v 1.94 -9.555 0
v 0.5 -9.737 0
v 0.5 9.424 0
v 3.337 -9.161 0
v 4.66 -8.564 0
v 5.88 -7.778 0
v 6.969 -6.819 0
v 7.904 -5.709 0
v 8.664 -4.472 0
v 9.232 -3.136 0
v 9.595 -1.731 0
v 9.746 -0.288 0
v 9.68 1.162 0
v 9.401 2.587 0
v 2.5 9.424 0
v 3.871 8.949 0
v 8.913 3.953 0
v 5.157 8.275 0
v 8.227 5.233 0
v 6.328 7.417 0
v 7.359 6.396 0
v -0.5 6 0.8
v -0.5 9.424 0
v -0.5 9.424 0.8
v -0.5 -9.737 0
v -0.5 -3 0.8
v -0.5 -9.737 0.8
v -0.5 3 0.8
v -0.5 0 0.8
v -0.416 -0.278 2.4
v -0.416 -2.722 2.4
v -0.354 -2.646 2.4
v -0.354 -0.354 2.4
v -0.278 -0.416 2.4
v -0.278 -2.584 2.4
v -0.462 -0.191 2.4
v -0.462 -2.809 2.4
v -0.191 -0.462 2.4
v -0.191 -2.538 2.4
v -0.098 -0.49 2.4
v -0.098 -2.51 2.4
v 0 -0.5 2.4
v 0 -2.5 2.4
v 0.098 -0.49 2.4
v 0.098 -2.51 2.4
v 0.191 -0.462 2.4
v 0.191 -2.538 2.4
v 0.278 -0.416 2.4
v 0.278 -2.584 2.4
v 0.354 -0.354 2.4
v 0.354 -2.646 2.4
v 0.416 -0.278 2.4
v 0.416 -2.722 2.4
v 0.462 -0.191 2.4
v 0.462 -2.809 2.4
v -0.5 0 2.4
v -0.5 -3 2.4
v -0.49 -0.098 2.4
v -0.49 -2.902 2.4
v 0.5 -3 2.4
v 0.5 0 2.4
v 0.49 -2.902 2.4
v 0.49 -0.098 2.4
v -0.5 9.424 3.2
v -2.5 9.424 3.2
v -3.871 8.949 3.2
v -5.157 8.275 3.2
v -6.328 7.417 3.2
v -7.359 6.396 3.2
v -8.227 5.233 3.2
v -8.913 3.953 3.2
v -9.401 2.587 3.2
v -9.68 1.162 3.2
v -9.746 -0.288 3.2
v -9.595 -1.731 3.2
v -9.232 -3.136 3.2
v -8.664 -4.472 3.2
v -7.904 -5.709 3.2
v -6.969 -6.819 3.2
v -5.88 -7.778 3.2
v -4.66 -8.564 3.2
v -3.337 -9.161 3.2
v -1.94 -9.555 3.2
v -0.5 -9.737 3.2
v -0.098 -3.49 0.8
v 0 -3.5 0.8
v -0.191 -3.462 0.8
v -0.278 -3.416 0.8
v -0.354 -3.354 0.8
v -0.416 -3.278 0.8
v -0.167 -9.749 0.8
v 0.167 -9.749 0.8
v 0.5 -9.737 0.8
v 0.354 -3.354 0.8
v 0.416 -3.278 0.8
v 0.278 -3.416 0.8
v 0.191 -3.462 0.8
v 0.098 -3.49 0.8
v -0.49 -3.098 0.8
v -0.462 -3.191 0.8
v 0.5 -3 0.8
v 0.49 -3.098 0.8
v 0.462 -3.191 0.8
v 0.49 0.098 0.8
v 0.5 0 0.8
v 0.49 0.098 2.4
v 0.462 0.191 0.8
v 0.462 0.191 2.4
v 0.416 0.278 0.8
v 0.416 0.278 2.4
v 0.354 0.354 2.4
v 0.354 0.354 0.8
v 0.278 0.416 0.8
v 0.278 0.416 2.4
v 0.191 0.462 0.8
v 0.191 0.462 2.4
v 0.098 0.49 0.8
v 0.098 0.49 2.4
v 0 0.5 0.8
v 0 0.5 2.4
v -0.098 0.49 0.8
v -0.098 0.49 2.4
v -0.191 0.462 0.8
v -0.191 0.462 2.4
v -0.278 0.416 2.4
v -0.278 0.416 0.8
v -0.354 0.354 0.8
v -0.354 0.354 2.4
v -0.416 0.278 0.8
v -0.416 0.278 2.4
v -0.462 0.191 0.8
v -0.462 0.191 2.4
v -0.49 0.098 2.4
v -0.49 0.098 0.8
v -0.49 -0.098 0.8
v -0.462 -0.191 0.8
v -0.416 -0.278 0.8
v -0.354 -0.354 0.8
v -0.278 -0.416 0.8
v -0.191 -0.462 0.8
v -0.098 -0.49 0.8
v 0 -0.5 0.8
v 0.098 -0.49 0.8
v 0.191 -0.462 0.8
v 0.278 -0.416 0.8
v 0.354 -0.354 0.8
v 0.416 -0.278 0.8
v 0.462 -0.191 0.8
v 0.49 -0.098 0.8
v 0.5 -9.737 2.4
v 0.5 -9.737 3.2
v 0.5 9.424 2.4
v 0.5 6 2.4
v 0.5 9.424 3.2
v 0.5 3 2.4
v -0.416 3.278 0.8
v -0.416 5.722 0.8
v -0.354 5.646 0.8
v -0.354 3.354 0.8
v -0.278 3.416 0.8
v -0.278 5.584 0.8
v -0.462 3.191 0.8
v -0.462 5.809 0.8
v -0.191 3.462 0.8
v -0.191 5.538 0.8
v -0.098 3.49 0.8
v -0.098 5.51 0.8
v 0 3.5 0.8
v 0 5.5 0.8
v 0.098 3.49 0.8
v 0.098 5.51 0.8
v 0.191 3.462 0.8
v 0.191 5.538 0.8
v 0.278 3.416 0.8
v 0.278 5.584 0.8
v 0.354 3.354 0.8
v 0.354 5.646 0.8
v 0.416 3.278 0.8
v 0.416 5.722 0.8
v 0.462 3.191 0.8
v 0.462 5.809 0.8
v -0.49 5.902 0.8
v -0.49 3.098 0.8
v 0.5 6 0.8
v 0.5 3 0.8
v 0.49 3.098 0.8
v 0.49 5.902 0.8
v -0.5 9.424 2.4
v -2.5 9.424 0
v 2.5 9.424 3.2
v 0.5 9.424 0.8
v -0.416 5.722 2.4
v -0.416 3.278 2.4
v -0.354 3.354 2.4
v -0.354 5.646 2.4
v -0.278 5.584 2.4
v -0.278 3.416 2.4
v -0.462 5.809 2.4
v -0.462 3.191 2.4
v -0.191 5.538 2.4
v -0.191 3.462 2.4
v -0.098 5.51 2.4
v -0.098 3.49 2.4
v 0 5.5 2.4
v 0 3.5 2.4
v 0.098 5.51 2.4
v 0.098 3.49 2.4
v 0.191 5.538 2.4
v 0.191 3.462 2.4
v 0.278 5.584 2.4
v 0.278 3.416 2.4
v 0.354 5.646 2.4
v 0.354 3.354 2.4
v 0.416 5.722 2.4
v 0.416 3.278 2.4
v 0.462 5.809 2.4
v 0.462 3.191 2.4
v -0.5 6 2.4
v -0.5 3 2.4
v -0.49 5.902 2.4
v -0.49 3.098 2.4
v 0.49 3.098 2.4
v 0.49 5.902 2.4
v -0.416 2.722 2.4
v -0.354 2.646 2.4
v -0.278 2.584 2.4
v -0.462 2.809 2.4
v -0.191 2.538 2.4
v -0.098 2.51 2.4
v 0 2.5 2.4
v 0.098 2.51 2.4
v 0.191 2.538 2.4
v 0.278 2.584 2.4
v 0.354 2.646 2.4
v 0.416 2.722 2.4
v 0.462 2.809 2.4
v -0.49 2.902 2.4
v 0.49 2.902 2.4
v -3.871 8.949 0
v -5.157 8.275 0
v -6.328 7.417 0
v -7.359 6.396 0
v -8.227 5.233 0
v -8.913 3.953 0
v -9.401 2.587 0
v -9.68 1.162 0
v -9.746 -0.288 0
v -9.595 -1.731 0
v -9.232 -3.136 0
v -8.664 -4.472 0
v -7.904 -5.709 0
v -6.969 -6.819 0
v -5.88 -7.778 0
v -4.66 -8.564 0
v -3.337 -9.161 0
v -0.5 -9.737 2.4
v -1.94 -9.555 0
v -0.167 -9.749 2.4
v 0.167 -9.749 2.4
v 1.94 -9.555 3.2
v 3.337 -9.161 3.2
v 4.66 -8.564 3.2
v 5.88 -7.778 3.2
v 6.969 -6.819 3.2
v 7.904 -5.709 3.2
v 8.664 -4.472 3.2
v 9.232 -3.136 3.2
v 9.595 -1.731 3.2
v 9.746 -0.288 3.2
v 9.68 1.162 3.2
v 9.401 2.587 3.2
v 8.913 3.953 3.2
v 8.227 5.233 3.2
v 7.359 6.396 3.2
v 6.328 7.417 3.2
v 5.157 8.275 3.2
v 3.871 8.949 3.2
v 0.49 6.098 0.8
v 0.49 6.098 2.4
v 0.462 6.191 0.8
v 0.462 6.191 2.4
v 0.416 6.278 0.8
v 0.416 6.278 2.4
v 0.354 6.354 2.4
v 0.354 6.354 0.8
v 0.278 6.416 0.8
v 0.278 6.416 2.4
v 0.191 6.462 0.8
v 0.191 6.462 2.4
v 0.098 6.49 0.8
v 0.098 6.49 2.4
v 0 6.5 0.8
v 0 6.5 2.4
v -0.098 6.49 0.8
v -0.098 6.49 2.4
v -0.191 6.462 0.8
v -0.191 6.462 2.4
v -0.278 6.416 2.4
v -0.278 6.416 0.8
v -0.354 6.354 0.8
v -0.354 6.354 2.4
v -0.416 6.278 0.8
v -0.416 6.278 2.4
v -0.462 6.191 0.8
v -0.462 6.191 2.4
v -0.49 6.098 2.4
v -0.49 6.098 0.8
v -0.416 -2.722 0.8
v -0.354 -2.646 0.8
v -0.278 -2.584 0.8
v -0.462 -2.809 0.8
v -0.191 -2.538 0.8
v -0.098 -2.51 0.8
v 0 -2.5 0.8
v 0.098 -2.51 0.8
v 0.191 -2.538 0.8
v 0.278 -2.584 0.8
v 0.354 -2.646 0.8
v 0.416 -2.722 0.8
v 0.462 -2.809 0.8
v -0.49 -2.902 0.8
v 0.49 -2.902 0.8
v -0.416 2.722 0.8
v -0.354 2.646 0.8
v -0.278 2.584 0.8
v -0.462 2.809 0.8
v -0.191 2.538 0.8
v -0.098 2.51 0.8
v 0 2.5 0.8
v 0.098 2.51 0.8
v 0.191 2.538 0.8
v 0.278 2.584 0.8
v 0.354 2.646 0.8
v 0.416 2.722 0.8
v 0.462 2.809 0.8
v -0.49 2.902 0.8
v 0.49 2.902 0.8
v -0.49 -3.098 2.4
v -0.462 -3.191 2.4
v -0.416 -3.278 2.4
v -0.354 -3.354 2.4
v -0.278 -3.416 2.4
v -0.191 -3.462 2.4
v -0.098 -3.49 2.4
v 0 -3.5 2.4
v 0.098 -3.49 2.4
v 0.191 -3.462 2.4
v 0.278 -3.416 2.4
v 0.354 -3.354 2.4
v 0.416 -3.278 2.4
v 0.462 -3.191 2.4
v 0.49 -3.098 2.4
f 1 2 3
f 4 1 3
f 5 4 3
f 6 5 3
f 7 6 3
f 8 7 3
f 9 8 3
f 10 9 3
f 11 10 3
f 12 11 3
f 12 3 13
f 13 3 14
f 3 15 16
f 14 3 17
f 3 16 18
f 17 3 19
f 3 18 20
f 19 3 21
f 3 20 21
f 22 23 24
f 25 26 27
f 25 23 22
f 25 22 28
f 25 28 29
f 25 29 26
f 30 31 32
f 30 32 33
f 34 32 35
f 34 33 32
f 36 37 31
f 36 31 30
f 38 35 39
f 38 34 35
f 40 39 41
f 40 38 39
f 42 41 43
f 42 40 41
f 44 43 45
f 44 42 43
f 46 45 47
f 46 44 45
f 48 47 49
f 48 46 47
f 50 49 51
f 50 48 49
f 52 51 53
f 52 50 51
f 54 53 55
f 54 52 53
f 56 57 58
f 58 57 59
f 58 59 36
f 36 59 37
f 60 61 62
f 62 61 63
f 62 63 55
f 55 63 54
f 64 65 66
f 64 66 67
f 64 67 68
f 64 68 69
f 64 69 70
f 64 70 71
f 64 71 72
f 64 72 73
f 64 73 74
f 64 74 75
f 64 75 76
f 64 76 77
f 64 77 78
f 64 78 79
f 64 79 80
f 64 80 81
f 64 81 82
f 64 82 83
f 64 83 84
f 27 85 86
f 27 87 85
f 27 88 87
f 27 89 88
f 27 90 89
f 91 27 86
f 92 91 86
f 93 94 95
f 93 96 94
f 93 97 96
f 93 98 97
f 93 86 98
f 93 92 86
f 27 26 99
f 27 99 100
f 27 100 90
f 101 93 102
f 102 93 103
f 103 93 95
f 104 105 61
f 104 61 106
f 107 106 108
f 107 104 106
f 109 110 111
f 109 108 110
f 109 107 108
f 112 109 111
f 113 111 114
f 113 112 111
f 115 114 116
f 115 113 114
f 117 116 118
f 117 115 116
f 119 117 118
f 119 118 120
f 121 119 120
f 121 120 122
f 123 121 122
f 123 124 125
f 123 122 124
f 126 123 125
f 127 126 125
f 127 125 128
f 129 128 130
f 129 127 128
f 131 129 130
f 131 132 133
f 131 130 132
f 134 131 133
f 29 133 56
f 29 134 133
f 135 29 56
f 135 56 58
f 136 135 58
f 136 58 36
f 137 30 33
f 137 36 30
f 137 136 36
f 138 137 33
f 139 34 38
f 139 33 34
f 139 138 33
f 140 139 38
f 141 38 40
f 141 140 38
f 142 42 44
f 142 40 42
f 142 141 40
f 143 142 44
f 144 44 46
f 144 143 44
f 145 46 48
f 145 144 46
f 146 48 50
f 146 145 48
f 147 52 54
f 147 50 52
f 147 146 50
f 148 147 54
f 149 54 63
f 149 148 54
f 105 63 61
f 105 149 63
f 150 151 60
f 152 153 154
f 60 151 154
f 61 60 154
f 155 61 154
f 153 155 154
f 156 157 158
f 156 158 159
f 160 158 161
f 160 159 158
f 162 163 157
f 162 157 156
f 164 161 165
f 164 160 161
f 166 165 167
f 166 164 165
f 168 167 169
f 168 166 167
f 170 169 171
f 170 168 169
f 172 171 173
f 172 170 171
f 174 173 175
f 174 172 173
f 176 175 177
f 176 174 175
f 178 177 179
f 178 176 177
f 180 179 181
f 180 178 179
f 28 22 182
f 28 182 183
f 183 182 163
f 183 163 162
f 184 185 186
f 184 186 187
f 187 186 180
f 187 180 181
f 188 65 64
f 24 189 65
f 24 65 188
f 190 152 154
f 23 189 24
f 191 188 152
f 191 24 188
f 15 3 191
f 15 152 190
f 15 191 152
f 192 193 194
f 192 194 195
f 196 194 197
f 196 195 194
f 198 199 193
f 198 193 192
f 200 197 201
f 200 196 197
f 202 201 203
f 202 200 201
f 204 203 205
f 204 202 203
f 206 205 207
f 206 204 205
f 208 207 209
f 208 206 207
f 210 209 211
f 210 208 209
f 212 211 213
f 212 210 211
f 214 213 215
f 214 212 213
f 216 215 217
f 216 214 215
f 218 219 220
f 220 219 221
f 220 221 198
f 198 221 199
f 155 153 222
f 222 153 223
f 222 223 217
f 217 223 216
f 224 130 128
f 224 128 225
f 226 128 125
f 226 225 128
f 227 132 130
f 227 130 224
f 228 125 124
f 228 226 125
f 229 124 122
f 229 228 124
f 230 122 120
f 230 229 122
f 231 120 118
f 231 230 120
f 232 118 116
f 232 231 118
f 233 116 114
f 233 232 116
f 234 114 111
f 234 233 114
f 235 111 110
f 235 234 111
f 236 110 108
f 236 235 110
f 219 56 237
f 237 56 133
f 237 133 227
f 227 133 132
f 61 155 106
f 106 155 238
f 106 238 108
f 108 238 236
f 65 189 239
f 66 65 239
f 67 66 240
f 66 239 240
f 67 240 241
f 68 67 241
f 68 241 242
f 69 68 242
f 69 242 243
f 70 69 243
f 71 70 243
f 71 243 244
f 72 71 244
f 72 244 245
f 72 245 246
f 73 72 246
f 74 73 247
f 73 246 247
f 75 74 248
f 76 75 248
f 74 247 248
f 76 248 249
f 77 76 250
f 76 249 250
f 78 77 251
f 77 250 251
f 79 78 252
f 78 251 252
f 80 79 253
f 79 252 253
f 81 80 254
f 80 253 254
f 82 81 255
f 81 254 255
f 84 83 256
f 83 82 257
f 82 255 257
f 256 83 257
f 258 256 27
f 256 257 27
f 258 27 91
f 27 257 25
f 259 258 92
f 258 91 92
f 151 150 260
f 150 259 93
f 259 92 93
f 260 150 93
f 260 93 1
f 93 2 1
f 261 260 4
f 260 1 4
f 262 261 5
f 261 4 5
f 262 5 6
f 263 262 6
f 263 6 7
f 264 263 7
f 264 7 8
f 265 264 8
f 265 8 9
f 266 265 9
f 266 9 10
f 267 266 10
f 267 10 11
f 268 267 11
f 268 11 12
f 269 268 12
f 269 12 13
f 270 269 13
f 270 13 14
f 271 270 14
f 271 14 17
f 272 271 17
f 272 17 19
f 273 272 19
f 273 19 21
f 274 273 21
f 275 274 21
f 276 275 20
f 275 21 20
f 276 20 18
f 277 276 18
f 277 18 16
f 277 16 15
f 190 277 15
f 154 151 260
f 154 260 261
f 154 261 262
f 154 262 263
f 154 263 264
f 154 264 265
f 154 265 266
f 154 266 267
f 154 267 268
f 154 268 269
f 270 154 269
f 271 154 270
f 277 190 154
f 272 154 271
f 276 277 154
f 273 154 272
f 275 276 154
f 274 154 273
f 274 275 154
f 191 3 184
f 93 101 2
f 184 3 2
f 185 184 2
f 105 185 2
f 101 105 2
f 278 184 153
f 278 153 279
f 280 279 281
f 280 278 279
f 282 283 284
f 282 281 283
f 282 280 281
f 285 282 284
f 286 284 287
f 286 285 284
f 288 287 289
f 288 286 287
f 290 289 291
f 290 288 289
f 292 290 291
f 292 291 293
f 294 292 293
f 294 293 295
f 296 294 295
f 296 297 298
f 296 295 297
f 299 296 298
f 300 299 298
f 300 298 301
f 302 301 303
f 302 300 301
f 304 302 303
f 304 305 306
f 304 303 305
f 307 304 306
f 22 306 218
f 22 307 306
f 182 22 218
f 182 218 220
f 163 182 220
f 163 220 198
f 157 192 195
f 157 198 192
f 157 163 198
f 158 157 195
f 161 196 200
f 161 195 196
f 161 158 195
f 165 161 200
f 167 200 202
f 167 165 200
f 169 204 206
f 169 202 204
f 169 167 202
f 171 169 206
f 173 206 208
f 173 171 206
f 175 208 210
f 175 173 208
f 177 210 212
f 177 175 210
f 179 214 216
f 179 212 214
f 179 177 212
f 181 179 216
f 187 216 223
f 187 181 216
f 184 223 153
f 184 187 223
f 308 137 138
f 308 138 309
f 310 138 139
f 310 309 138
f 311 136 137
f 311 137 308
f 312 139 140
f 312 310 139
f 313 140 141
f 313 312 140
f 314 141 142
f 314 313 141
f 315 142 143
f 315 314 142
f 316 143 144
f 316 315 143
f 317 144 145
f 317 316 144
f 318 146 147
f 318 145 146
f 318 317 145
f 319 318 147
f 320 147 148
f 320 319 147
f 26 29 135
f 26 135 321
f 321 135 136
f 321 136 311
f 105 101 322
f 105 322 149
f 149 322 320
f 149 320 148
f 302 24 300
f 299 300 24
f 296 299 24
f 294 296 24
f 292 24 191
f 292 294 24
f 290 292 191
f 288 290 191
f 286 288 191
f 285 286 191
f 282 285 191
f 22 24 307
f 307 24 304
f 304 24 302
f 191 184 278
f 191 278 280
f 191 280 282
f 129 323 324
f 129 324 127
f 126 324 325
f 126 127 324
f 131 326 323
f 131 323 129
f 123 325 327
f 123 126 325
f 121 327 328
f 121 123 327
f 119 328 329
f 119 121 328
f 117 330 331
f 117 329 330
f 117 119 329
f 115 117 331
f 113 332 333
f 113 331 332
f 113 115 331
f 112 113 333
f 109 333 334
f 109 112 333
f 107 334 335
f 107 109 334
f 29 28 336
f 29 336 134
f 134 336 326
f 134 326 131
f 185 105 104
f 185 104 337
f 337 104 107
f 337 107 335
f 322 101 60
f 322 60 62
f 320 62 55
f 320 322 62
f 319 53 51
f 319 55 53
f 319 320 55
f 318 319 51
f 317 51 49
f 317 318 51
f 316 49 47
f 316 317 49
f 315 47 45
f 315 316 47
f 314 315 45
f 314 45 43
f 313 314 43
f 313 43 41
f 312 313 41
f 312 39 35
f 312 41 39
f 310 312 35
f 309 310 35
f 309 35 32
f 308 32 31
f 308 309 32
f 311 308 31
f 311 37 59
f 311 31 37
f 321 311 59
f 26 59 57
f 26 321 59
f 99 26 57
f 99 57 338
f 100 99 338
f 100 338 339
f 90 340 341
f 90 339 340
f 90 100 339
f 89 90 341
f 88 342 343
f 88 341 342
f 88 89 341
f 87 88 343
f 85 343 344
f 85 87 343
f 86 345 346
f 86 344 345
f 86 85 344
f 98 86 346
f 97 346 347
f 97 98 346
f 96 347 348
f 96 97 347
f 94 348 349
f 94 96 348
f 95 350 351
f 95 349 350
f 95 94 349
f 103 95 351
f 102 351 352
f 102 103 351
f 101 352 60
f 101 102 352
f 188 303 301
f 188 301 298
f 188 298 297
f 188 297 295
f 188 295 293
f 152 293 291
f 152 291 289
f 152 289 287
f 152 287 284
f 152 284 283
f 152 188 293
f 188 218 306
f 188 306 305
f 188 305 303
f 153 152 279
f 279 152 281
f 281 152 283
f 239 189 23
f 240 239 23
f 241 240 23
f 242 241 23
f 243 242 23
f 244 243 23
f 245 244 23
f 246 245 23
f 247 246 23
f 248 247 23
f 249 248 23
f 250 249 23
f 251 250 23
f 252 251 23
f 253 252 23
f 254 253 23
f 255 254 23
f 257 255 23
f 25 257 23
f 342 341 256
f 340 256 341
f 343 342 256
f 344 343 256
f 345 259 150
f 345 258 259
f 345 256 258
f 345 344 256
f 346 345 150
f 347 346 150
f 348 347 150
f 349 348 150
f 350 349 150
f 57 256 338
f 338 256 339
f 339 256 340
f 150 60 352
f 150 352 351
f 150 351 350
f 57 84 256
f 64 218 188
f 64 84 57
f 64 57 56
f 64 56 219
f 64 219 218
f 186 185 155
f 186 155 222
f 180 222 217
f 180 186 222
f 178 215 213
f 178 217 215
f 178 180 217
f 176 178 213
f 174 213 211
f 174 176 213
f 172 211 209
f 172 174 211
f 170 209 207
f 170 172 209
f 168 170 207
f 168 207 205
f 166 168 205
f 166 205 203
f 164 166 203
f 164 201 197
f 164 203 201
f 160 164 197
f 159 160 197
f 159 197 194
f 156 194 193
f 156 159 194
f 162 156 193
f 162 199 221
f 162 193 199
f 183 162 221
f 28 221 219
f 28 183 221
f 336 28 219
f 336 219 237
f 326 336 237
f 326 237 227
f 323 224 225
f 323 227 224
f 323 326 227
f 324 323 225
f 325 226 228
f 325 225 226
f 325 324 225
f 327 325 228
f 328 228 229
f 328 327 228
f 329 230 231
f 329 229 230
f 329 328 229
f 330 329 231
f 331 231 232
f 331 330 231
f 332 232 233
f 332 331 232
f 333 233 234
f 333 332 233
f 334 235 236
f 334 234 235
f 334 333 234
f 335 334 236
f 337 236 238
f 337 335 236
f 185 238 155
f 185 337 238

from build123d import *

# Parameters (mm, degrees)
PAD_DEPTH       = 3.2
SKETCH001_W     = 1
SKETCH001_H     = 22
POCKET_DEPTH    = 0.8
SKETCH002_R     = 0.5
POCKET001_DEPTH = 3.201
SKETCH003_W     = 1
SKETCH003_H     = 22
POCKET002_DEPTH = 0.8


with BuildPart() as part:
    # Sketch → Pad (new body)
    with BuildSketch(Plane.XY):
        with BuildLine():
            ThreePointArc((-2.5, 9.424038), (0, -9.75), (2.5, 9.424038))
            Line((-2.5, 9.424038), (2.5, 9.424038))
        make_face()
    extrude(amount=PAD_DEPTH)

    # Sketch001 (on Face4 of Pad) → Pocket (cut)
    with BuildSketch(Plane.XY.offset(3.2)):
        Rectangle(SKETCH001_W, SKETCH001_H)
    extrude(amount=-POCKET_DEPTH, mode=Mode.SUBTRACT)

    # Sketch002 → Pocket001 (cut, through all)
    with BuildSketch(Plane.XY):
        with Locations((0, 6)):
            Circle(SKETCH002_R)
        with Locations((0, 3)):
            Circle(SKETCH002_R)
        Circle(SKETCH002_R)
        with Locations((0, -3)):
            Circle(SKETCH002_R)
    extrude(amount=POCKET001_DEPTH, mode=Mode.SUBTRACT)

    # Sketch003 (on Face2 of Pocket001) → Pocket002 (cut)
    with BuildSketch(Plane(origin=(0, 0, 0), x_dir=(1, 0, 0), z_dir=(0, 0, -1))):
        Rectangle(SKETCH003_W, SKETCH003_H)
    extrude(amount=-POCKET002_DEPTH, mode=Mode.SUBTRACT)


solid = part.part
